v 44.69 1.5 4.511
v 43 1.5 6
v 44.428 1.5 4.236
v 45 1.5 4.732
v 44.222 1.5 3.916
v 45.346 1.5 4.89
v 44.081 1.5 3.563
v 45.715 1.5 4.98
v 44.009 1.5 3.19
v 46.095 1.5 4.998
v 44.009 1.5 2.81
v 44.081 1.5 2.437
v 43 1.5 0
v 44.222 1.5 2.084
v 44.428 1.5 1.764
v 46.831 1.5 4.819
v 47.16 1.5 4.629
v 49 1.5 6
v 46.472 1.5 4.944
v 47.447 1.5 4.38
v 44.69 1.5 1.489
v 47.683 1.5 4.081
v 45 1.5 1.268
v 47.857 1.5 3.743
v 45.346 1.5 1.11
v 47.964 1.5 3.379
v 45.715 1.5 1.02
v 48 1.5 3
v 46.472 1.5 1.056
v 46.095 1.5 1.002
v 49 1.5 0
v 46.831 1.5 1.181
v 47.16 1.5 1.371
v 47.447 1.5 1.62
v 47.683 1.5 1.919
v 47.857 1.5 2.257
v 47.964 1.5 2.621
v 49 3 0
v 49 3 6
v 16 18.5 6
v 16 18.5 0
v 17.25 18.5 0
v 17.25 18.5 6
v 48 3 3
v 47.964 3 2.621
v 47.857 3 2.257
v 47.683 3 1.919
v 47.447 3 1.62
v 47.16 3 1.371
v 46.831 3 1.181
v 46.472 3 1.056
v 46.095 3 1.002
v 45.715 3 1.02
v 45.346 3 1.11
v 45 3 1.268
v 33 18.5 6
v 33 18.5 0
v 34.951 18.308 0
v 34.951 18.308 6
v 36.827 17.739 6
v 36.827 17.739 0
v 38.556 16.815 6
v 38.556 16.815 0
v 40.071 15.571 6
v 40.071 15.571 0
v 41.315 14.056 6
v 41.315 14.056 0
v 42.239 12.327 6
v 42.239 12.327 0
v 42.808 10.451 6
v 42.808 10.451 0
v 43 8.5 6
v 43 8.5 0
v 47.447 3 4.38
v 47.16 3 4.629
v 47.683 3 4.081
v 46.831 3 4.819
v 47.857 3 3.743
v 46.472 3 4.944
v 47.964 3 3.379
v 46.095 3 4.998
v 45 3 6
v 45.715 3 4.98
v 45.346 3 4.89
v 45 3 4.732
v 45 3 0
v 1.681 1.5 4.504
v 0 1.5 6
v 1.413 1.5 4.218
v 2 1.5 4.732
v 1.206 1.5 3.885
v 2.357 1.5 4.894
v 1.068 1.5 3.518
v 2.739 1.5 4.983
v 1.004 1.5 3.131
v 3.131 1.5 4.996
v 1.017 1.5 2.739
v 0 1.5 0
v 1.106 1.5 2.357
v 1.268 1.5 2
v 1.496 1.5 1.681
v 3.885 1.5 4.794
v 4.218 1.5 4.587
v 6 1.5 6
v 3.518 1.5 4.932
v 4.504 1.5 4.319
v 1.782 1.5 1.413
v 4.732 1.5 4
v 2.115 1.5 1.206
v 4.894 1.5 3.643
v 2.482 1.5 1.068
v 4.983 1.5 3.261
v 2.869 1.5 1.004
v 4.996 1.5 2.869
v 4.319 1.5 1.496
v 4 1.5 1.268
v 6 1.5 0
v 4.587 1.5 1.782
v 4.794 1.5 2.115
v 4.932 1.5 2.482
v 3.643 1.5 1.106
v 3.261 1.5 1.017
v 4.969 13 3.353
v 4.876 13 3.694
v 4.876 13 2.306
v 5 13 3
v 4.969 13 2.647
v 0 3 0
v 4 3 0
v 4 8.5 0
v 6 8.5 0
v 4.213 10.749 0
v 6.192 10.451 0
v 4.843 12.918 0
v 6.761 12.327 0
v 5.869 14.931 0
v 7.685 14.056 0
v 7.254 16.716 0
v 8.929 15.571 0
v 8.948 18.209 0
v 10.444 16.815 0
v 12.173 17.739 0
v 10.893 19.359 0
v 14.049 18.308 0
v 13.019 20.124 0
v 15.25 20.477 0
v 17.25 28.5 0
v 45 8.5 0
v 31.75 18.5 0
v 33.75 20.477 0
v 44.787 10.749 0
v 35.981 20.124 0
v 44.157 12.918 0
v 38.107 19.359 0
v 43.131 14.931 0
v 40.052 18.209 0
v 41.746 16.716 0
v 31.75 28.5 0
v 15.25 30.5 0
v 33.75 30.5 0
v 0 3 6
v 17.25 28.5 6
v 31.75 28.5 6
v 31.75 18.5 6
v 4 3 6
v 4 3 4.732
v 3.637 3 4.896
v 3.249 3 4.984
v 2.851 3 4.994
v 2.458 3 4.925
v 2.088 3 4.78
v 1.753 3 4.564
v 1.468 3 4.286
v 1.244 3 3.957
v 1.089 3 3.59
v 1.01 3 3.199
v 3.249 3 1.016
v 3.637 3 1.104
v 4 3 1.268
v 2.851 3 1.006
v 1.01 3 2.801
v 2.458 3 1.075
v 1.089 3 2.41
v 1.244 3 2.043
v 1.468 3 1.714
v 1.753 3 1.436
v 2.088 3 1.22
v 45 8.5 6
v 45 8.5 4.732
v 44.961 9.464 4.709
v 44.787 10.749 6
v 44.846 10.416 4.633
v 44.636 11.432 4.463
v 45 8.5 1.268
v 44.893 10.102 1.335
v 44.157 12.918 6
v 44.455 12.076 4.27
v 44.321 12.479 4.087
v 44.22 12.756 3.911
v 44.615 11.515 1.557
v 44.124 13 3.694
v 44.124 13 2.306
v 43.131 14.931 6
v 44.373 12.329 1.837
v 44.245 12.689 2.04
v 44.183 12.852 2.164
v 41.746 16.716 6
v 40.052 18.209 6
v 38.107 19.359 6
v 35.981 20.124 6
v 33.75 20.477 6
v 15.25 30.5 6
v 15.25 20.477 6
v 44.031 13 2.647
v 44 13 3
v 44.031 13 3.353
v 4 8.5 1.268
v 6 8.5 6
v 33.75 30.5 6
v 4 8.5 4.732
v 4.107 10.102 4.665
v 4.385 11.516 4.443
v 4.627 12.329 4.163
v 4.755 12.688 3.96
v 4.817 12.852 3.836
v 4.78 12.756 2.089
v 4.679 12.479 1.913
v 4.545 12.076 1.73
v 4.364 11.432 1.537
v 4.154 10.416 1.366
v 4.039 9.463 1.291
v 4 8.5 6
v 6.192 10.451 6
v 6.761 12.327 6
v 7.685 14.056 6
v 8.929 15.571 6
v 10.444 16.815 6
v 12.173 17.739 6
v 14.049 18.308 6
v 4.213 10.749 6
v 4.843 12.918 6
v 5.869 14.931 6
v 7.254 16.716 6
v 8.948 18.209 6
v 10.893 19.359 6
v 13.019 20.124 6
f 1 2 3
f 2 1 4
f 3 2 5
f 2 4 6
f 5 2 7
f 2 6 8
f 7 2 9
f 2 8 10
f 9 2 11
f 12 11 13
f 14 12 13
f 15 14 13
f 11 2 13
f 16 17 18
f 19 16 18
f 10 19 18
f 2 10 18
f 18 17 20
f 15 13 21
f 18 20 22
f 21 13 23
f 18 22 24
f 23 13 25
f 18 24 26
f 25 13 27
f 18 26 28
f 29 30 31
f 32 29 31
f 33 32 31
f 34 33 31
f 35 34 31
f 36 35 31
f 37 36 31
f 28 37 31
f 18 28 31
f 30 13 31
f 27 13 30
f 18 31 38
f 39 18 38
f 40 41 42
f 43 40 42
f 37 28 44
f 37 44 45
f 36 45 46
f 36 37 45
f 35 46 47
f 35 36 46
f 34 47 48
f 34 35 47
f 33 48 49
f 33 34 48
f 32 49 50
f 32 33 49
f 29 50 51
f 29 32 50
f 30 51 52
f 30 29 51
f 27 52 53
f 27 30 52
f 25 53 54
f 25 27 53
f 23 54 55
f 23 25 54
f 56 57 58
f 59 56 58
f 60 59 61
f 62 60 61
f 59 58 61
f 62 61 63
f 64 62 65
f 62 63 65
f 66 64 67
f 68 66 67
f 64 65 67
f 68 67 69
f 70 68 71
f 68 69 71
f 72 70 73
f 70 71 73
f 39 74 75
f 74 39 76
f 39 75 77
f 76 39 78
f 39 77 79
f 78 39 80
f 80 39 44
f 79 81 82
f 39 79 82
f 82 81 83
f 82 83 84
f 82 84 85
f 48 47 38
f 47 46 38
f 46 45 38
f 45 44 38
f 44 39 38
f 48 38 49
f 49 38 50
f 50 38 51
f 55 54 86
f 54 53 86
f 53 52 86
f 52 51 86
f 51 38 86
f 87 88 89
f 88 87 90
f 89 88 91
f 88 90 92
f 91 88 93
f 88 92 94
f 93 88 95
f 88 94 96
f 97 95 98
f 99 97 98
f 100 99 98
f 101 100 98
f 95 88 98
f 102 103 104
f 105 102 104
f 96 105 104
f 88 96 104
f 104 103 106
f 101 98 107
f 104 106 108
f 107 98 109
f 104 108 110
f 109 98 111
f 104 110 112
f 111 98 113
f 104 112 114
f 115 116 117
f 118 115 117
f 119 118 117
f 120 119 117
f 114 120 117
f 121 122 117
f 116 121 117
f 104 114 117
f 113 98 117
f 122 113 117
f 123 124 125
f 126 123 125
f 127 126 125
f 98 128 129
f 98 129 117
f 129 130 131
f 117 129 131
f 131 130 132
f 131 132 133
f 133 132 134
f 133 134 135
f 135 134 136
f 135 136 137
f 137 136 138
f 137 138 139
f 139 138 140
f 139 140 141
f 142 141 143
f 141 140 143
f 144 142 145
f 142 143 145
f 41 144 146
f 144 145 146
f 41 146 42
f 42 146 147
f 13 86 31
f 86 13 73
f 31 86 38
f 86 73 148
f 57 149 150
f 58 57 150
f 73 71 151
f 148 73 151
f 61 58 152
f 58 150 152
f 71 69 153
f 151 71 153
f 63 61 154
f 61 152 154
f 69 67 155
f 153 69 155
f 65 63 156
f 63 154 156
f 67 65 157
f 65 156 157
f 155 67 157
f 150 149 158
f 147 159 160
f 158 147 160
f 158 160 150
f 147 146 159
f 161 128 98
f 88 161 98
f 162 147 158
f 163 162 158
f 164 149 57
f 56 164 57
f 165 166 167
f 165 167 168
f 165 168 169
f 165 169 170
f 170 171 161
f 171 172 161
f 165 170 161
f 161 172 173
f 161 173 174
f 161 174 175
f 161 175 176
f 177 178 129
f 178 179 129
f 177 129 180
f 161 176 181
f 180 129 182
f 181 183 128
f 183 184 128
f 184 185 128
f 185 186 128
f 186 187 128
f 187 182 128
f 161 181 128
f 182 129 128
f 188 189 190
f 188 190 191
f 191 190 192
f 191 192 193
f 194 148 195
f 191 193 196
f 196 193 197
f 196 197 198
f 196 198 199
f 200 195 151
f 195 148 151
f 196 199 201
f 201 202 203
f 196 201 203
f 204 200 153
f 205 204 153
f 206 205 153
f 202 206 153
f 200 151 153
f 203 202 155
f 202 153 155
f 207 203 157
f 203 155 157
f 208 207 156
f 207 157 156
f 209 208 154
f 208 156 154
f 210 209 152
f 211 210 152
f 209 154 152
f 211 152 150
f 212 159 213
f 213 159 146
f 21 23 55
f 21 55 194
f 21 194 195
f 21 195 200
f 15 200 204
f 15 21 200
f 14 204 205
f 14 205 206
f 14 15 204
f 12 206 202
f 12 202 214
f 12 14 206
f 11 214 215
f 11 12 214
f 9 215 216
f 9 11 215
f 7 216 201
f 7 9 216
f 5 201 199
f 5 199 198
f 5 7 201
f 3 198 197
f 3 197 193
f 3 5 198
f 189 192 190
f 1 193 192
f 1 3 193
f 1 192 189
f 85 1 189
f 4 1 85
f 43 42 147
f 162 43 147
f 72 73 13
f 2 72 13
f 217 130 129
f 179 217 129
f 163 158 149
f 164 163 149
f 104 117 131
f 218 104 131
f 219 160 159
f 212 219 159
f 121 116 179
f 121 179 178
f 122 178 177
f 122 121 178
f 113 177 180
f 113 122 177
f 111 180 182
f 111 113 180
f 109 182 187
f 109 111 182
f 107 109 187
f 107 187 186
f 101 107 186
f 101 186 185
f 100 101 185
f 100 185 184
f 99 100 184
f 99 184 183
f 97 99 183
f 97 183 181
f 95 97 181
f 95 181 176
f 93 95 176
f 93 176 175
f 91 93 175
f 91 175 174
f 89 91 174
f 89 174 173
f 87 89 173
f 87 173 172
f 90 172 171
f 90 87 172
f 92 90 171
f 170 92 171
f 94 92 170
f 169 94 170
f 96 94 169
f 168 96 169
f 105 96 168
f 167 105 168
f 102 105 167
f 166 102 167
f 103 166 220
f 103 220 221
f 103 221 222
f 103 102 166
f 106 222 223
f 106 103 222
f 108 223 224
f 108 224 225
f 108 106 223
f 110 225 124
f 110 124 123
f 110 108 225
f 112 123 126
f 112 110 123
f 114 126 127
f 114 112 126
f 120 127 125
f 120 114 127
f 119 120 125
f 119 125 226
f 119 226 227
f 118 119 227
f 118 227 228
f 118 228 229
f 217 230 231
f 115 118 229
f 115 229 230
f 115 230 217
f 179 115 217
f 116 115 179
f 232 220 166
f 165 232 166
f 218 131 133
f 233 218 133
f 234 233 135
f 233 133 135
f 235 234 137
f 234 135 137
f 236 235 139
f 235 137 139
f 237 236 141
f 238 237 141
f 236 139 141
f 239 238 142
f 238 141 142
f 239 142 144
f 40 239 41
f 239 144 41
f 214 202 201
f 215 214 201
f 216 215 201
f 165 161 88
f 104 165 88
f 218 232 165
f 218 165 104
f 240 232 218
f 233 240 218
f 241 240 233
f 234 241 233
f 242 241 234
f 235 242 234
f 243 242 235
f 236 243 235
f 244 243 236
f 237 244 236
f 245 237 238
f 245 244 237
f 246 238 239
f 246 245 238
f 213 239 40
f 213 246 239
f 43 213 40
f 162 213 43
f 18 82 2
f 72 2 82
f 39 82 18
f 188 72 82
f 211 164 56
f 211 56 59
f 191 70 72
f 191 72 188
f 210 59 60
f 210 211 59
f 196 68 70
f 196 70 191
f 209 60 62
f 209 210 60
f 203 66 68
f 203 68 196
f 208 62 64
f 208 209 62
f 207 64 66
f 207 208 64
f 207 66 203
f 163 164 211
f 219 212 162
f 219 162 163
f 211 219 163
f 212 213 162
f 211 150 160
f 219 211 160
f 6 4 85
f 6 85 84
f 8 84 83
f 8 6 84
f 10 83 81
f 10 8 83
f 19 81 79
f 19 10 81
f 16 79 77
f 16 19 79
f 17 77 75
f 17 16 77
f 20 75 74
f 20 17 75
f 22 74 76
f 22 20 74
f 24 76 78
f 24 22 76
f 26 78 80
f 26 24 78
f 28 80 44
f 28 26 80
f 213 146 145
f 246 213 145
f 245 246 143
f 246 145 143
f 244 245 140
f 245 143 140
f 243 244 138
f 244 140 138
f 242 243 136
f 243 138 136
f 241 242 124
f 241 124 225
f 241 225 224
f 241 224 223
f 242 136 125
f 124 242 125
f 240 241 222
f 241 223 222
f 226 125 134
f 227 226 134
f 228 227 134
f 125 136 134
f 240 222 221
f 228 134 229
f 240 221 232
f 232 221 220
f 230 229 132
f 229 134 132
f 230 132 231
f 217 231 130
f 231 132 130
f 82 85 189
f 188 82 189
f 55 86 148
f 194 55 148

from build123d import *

# Parameters (mm, degrees)
EXTRUDE_1_DEPTH          = 6
CUT_EXTRUDE_1_DEPTH      = 10
CUT_EXTRUDE_1_DEPTH_BACK = 10
SKETCH_2_R               = 2


with BuildPart() as part:
    # 스케치1 → 보스-돌출1 (new body)
    with BuildSketch(Plane.XY):
        with BuildLine():
            Line((31.75, 18.5), (33, 18.5))
            ThreePointArc((33, 18.5), (40.071067812, 15.571067812), (43, 8.5))
            Line((43, 8.5), (43, 1.5))
            Line((43, 1.5), (49, 1.5))
            Line((49, 1.5), (49, 3))
            Line((49, 3), (45, 3))
            Line((45, 3), (45, 8.5))
            ThreePointArc((45, 8.5), (41.746427842, 16.715838363), (33.75, 20.476539567))
            Line((33.75, 20.476539567), (33.75, 30.5))
            Line((33.75, 30.5), (15.25, 30.5))
            Line((15.25, 30.5), (15.25, 20.476539567))
            ThreePointArc((15.25, 20.476539567), (7.253572158, 16.715838363), (4, 8.5))
            Line((4, 8.5), (4, 3))
            Line((4, 3), (0, 3))
            Line((0, 3), (0, 1.5))
            Line((0, 1.5), (6, 1.5))
            Line((6, 1.5), (6, 8.5))
            ThreePointArc((6, 8.5), (8.928932188, 15.571067812), (16, 18.5))
            Line((16, 18.5), (17.25, 18.5))
            Line((17.25, 18.5), (17.25, 28.5))
            Line((17.25, 28.5), (31.75, 28.5))
            Line((31.75, 28.5), (31.75, 18.5))
        make_face()
    extrude(amount=EXTRUDE_1_DEPTH)

    # 스케치2 → 컷-돌출1 (cut, two sides: drawn at the far end of the back side and taken through both)
    with BuildSketch(Plane(origin=(0, 3, 0), x_dir=(1, 0, 0), z_dir=(0, 1, 0)).offset(-CUT_EXTRUDE_1_DEPTH_BACK)):
        with BuildLine():
            ThreePointArc((45, -4.732050808), (47, -4.732050808), (48, -3))
            ThreePointArc((48, -3), (47, -1.267949192), (45, -1.267949192))
            Line((45, -1.267949192), (45, -4.732050808))
        make_face()
        with BuildLine():
            Line((45, -4.732050808), (45, -1.267949192))
            ThreePointArc((45, -1.267949192), (44, -3), (45, -4.732050808))
        make_face()
        with Locations(Location((3, -3, 0), (0, 0, 60))):
            Circle(SKETCH_2_R)
    extrude(amount=CUT_EXTRUDE_1_DEPTH + CUT_EXTRUDE_1_DEPTH_BACK, mode=Mode.SUBTRACT)


solid = part.part
